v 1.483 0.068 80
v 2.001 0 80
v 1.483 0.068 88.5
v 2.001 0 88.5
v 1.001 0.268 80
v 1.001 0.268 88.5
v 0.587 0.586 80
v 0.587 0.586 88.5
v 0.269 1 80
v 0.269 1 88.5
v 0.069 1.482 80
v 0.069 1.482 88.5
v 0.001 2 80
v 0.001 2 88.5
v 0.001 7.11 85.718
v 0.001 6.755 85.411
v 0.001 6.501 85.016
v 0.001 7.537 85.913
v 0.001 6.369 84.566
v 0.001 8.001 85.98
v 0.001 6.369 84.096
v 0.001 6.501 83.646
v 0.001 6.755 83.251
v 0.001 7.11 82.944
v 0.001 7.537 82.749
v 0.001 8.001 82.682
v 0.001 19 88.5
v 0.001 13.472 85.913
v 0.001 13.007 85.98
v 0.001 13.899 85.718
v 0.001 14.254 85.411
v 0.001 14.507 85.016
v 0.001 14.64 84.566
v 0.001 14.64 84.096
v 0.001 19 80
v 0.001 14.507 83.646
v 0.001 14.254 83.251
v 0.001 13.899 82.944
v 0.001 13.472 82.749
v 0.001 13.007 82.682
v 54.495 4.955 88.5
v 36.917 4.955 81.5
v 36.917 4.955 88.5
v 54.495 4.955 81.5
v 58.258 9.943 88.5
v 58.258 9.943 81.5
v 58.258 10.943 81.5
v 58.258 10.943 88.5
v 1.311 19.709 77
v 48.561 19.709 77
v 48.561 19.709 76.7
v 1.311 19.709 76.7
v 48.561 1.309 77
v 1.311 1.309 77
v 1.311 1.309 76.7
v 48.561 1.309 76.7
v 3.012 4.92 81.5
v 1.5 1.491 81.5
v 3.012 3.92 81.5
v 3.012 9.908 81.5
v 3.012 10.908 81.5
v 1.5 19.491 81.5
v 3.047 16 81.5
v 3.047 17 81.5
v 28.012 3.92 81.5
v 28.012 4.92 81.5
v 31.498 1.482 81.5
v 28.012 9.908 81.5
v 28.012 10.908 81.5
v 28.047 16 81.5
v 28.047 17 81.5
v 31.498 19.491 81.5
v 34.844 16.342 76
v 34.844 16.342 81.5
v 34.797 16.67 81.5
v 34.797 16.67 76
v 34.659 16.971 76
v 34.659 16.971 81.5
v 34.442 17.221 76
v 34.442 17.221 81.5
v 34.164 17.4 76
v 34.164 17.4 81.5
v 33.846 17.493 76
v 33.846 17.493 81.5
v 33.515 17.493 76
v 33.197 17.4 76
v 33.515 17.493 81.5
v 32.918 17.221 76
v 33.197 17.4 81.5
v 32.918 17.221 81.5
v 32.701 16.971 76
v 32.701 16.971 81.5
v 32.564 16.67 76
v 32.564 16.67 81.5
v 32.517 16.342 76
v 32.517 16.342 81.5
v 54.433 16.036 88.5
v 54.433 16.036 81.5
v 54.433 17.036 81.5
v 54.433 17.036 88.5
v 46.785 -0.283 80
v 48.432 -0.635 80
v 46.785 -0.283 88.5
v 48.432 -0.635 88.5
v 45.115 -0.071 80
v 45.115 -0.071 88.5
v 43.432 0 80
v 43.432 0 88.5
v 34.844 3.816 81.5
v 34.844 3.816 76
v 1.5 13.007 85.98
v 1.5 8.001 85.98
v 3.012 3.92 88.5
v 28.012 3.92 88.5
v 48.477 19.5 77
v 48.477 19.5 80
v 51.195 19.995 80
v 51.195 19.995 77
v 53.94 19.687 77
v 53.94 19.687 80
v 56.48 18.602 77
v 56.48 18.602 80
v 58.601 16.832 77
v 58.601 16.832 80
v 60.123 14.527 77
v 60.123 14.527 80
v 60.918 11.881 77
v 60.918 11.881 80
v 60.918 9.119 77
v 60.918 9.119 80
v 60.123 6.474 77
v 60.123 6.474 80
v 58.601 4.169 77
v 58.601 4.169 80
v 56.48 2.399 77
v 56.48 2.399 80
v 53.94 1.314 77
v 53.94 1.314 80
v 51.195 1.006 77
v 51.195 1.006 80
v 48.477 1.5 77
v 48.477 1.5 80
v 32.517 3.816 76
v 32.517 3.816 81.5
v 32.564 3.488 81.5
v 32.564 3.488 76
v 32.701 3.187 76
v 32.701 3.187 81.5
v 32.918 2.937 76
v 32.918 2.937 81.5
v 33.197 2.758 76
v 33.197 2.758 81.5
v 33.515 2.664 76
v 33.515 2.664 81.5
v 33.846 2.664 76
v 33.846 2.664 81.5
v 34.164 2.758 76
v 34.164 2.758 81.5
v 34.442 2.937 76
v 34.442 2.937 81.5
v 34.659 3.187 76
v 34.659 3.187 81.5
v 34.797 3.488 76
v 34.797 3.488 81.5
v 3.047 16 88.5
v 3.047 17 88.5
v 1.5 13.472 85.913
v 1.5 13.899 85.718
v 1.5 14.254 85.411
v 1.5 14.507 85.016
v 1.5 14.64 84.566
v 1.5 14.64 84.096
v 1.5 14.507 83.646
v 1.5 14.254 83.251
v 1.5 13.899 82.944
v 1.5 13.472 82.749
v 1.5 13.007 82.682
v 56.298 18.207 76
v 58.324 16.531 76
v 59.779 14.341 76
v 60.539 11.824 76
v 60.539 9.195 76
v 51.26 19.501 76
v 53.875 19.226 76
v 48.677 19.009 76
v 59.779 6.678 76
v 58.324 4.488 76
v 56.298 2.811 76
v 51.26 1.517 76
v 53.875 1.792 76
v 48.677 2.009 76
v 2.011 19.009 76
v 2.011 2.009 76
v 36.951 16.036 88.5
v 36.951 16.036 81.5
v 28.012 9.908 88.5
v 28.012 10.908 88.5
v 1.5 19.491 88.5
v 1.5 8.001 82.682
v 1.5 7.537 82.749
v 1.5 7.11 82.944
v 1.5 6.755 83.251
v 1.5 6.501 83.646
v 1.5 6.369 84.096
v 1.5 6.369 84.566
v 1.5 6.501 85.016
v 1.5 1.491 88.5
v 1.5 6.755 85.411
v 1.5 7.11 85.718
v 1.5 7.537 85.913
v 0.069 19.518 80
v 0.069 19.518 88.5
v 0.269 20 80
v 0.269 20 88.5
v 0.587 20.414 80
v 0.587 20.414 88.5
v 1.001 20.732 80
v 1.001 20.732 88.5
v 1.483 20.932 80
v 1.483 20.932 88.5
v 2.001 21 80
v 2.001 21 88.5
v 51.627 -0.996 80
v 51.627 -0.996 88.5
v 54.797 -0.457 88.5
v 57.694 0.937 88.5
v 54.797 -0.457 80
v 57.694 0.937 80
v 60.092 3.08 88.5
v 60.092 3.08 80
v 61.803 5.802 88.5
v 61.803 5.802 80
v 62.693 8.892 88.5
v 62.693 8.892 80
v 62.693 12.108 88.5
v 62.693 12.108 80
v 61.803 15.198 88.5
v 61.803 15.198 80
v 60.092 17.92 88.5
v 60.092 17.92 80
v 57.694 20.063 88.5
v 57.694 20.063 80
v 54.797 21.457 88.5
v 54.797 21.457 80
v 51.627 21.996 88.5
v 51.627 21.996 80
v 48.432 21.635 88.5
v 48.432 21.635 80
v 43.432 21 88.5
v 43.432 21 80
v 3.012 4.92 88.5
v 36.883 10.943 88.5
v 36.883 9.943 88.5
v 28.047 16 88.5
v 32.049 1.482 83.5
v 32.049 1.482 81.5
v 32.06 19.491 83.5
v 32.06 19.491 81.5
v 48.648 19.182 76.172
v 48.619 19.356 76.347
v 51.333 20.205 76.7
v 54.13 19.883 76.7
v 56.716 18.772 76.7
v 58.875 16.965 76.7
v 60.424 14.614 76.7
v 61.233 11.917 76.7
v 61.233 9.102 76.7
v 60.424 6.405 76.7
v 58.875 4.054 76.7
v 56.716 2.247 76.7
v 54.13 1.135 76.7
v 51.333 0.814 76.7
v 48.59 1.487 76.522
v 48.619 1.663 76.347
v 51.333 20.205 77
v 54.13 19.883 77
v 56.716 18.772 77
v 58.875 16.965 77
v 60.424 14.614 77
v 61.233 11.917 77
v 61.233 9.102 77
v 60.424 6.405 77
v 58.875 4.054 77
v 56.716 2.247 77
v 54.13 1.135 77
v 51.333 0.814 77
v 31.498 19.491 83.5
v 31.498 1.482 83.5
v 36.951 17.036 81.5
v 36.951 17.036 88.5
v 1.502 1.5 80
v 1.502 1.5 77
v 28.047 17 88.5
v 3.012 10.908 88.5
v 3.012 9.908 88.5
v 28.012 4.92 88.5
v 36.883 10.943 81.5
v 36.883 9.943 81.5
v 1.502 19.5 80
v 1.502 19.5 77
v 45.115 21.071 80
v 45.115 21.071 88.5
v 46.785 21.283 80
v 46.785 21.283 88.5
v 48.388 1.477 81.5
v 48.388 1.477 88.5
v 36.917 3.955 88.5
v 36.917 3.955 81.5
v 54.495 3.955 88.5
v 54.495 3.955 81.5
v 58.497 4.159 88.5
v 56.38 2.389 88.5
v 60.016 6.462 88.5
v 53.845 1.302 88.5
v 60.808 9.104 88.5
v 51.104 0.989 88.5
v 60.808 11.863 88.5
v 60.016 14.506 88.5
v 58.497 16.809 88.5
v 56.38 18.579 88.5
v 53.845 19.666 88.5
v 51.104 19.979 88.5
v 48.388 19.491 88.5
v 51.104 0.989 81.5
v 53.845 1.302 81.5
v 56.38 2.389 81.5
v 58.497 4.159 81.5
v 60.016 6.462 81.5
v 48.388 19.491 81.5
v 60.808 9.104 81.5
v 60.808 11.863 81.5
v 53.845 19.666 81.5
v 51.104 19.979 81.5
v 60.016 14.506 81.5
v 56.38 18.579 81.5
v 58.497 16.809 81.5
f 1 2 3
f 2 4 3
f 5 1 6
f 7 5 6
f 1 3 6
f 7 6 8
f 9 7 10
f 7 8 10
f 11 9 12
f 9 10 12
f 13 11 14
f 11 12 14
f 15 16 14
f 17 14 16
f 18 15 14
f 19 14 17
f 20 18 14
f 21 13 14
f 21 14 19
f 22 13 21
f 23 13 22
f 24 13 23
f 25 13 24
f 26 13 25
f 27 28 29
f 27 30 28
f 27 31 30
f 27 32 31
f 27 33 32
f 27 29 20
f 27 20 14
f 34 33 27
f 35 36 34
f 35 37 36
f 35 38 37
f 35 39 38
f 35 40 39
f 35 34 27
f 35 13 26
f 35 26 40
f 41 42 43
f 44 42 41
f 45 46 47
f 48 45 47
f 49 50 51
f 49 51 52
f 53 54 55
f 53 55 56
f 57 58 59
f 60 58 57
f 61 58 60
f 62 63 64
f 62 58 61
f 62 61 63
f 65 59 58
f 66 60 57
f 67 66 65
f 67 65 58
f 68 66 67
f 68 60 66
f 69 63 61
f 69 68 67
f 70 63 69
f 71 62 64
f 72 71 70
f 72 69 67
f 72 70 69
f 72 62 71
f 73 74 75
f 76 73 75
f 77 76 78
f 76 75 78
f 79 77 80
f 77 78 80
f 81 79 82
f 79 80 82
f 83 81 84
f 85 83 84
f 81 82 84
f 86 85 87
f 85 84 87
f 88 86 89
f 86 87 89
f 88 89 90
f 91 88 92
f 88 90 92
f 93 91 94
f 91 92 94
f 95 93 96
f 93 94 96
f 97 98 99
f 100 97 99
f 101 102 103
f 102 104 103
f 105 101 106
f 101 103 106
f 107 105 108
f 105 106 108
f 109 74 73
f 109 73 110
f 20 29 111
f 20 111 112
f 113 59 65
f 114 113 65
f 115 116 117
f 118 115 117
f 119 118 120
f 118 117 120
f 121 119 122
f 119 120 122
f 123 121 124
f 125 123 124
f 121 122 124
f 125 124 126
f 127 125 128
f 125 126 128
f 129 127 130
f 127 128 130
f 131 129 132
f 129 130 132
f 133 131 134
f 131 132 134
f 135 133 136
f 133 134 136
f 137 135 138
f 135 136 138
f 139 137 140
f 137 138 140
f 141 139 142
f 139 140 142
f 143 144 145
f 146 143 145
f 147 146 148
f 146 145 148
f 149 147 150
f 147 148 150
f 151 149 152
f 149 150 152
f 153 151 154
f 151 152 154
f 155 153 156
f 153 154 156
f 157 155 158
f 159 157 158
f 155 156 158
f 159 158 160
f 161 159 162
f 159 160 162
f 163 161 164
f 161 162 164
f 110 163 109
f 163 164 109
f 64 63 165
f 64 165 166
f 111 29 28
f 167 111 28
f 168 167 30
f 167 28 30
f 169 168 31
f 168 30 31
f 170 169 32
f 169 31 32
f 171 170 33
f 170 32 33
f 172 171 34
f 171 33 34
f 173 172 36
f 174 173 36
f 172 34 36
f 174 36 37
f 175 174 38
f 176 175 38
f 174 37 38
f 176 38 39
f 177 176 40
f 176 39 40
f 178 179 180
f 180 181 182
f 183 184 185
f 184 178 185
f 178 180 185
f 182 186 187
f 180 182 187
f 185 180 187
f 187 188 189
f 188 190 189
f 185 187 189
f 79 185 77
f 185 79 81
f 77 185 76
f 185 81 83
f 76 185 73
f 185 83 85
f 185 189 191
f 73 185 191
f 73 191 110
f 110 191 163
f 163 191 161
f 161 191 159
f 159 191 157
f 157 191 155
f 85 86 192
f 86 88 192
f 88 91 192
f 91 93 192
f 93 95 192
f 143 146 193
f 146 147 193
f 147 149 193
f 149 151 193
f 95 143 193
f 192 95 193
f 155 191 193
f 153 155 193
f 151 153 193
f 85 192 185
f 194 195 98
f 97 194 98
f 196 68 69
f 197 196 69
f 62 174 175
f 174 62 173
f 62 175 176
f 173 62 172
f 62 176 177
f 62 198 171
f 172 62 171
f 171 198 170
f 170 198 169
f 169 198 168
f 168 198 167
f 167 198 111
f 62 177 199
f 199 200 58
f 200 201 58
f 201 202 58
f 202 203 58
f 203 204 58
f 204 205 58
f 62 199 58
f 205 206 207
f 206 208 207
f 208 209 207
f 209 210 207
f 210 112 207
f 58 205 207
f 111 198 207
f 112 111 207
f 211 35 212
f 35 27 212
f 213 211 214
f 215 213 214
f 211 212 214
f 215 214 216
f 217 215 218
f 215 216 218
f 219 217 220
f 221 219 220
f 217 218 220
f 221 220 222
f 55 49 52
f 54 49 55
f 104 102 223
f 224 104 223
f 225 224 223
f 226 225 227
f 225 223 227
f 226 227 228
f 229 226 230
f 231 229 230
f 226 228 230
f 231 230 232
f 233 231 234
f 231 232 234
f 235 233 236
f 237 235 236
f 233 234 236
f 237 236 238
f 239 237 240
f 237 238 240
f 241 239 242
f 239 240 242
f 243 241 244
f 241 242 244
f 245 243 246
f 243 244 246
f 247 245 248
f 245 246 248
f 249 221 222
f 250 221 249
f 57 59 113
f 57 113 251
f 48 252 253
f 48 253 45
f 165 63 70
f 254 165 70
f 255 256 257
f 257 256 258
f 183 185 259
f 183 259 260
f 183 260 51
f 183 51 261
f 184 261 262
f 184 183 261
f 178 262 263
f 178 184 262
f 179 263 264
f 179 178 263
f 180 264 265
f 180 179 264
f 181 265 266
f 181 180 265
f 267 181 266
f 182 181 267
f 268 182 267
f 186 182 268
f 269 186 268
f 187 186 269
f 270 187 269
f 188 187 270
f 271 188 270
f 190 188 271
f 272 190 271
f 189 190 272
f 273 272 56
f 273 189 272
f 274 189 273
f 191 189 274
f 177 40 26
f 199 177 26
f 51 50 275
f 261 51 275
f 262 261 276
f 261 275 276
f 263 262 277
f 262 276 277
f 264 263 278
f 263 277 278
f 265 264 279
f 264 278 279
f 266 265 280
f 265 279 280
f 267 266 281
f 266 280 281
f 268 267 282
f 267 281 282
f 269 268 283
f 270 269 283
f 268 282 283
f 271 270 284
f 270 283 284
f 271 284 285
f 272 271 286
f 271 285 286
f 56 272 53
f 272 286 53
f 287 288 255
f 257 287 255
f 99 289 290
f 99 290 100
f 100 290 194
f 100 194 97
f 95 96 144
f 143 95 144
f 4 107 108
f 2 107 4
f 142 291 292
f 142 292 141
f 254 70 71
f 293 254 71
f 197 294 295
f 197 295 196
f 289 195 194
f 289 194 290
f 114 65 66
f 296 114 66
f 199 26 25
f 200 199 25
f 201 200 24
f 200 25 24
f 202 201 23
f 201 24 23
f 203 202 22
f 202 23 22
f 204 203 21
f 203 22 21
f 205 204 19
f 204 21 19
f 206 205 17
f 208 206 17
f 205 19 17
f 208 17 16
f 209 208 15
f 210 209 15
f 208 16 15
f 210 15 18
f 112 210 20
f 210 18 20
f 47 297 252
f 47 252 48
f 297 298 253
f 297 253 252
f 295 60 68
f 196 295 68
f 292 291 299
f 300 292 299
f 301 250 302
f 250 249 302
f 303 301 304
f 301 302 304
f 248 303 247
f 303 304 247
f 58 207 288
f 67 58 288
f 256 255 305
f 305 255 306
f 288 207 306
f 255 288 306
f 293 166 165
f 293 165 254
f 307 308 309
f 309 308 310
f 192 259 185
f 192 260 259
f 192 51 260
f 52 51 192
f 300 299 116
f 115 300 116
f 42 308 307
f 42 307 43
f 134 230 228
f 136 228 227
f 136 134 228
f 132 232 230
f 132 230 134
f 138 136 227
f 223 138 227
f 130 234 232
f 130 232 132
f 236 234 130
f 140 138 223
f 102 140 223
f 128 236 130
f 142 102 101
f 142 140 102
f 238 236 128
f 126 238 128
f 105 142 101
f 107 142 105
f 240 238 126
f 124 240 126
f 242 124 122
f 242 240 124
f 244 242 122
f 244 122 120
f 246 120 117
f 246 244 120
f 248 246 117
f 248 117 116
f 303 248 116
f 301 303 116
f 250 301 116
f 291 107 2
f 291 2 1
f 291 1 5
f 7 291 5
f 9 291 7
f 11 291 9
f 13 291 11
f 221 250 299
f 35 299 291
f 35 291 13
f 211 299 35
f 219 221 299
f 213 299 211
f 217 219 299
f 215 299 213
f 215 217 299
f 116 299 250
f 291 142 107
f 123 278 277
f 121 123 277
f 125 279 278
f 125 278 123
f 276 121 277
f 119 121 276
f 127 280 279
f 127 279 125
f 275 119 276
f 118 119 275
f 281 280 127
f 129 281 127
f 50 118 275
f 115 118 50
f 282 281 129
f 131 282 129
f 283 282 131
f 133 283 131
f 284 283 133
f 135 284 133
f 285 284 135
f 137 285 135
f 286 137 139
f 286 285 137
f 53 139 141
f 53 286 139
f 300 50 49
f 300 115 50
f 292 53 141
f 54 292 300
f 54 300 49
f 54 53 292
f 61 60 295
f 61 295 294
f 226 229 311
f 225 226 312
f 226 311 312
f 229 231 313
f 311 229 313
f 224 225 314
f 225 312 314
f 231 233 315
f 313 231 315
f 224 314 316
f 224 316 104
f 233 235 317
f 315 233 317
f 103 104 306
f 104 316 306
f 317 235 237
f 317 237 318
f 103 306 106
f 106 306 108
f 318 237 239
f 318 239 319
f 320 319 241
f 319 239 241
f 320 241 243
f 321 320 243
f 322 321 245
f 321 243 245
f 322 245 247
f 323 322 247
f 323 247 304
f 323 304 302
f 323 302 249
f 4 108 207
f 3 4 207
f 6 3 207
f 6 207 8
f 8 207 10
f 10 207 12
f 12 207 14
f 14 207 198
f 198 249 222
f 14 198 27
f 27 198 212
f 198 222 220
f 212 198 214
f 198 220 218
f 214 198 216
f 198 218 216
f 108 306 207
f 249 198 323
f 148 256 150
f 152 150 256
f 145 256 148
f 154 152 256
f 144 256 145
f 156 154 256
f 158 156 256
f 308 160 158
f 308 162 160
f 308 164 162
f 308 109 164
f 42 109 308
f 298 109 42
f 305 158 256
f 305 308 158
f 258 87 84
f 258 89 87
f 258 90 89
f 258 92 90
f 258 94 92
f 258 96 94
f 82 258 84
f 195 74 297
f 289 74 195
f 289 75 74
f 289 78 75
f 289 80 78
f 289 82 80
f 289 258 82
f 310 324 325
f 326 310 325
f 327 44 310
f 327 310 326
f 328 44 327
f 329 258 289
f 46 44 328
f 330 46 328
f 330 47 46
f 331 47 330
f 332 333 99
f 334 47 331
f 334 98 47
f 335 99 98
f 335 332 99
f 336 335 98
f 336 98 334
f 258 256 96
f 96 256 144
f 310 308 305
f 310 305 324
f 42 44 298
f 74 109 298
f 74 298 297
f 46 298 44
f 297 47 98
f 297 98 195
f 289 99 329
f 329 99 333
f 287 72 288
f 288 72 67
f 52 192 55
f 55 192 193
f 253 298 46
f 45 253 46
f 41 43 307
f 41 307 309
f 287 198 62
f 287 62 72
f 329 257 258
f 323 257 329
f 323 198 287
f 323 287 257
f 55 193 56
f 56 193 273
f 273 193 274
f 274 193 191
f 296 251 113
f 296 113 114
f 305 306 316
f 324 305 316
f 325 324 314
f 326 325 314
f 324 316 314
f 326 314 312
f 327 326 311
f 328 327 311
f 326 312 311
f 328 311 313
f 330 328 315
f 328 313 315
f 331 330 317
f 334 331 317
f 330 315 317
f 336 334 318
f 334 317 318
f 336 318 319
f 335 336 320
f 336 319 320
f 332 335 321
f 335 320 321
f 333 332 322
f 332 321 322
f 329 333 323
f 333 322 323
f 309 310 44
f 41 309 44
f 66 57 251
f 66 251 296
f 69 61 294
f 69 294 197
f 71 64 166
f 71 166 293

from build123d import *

# Parameters (mm, degrees)
PAD001_DEPTH    = 8.5
PAD002_DEPTH    = 3
FILLET008_R     = 20
FILLET009_R     = 20
FILLET010_R     = 2
FILLET011_R     = 2
POCKET002_DEPTH = 7
POCKET003_DEPTH = 5
PAD006_DEPTH    = 2
POCKET004_DEPTH = 5
PAD007_DEPTH    = 1
CHAMFER_SIZE    = 0.7
POCKET009_DEPTH = 5
SKETCH017_W     = 25
SKETCH017_H     = 1
SKETCH017_W_2   = 17.481396
SKETCH017_W_3   = 21.375297
SKETCH017_W_4   = 17.578514
PAD008_DEPTH    = 7


with BuildPart() as part:
    # Sketch004 → Pad001 (new body)
    with BuildSketch(Plane.XY.offset(80)):
        with BuildLine():
            Line((0.000991, 21), (46.615791, 21))
            ThreePointArc((46.615791, 0), (62.806207, 10.5), (46.615791, 21))
            Line((46.615791, 0), (0.000991, 0))
            Line((0.000991, 0), (0.000991, 21))
        make_face()
    extrude(amount=PAD001_DEPTH)

    # Sketch005 → Pad002 (new body)
    with BuildSketch(Plane(origin=(0, 0, 80), x_dir=(1, 0, 0), z_dir=(0, 0, -1))):
        with BuildLine():
            Line((1.502067, -19.500282), (48.477067, -19.500282))
            ThreePointArc((48.477067, -19.500282), (61.018448, -10.500282), (48.477067, -1.500282))
            Line((1.502067, -1.500282), (48.477067, -1.500282))
            Line((1.502067, -1.500282), (1.502067, -19.500282))
        make_face()
    extrude(amount=PAD002_DEPTH)

    # Fillet008
    fillet008_edges = [part.edges().sort_by_distance(p)[0] for p in [
        (46.615791, 21, 84.25),
    ]]
    fillet(fillet008_edges, radius=FILLET008_R)

    # Fillet009
    fillet009_edges = [part.edges().sort_by_distance(p)[0] for p in [
        (46.615791, 0, 84.25),
    ]]
    fillet(fillet009_edges, radius=FILLET009_R)

    # Fillet010
    fillet010_edges = [part.edges().sort_by_distance(p)[0] for p in [
        (0.000991, 0, 84.25),
    ]]
    fillet(fillet010_edges, radius=FILLET010_R)

    # Fillet011
    fillet011_edges = [part.edges().sort_by_distance(p)[0] for p in [
        (0.000991, 21, 84.25),
    ]]
    fillet(fillet011_edges, radius=FILLET011_R)

    # Sketch006 → Pocket002 (cut)
    with BuildSketch(Plane.XY.offset(88.5)):
        with BuildLine():
            Line((1.500423, 1.490874), (48.388216, 1.476974))
            ThreePointArc((48.388216, 1.476974), (60.908955, 10.483923), (48.388218, 19.490874))
            Line((1.500423, 19.490874), (48.388218, 19.490874))
            Line((1.500423, 19.490874), (1.500423, 1.490874))
        make_face()
    extrude(amount=-POCKET002_DEPTH, mode=Mode.SUBTRACT)

    # Sketch007 → Pocket003 (cut)
    with BuildSketch(Plane(origin=(0.000991, 0, 80), x_dir=(0, -1, 0), z_dir=(-1, 0, 0))):
        with BuildLine():
            ThreePointArc((-13.007468, 5.979853), (-14.65632, 4.331001), (-13.007468, 2.682149))
            Line((-13.007468, 2.682149), (-8.001338, 2.682149))
            ThreePointArc((-8.001338, 2.682149), (-6.352486, 4.331001), (-8.001338, 5.979853))
            Line((-13.007468, 5.979853), (-8.001338, 5.979853))
        make_face()
    extrude(amount=-POCKET003_DEPTH, mode=Mode.SUBTRACT)

    # Sketch012 → Pad006 (new body)
    with BuildSketch(Plane.XY.offset(81.5)):
        Polygon((31.498466, 19.496653), (31.498466, 1.452961), (32.048512, 1.452961), (32.059631, 19.496653), align=None)
    extrude(amount=PAD006_DEPTH)

    # Sketch013 → Pocket004 (cut)
    with BuildSketch(Plane.XY.offset(81.5)):
        with BuildLine():
            ThreePointArc((34.843688, 16.341736), (33.680227, 17.505197), (32.516766, 16.341736))
            Line((32.516766, 16.341736), (32.516766, 3.815891))
            ThreePointArc((32.516766, 3.815891), (33.680227, 2.65243), (34.843688, 3.815891))
            Line((34.843688, 16.341736), (34.843688, 3.815891))
        make_face()
    extrude(amount=-POCKET004_DEPTH, mode=Mode.SUBTRACT)

    # Sketch015 → Pad007 (new body)
    with BuildSketch(Plane(origin=(0, 0, 77), x_dir=(1, 0, 0), z_dir=(0, 0, -1))):
        with BuildLine():
            Line((1.311159, -1.309228), (48.561159, -1.309228))
            ThreePointArc((48.561159, -19.709228), (61.335244, -10.509228), (48.561159, -1.309228))
            Line((48.561159, -19.709228), (1.311159, -19.709228))
            Line((1.311159, -19.709228), (1.311159, -1.309228))
        make_face()
    extrude(amount=PAD007_DEPTH)

    # Chamfer
    chamfer_edges = [part.edges().sort_by_distance(p)[0] for p in [
        (1.311159, 10.509228, 76),
        (24.936159, 1.309228, 76),
        (24.936159, 19.709228, 76),
        (61.335244, 10.509228, 76),
    ]]
    chamfer(chamfer_edges, length=CHAMFER_SIZE)

    # Sketch016 → Pocket009 (cut)
    with BuildSketch(Plane.XY.offset(77)):
        with BuildLine():
            ThreePointArc((34.843688, 16.341736), (33.680227, 17.505197), (32.516766, 16.341736))
            Line((32.516766, 16.341736), (32.516766, 3.815891))
            ThreePointArc((32.516766, 3.815891), (33.680227, 2.65243), (34.843688, 3.815891))
            Line((34.843688, 16.341736), (34.843688, 3.815891))
        make_face()
    extrude(amount=-POCKET009_DEPTH, mode=Mode.SUBTRACT)

    # Sketch017 → Pad008 (new body)
    with BuildSketch(Plane.XY.offset(81.5)):
        with Locations((15.546838, 16.499521)):
            Rectangle(SKETCH017_W, SKETCH017_H)
        with Locations((15.512423, 10.408272)):
            Rectangle(SKETCH017_W, SKETCH017_H)
        with Locations((15.512423, 4.420265)):
            Rectangle(SKETCH017_W, SKETCH017_H)
        with Locations((45.692045, 16.535934)):
            Rectangle(SKETCH017_W_2, SKETCH017_H)
        with Locations((47.570167, 10.442687)):
            Rectangle(SKETCH017_W_3, SKETCH017_H)
        with Locations((45.706188, 4.454679)):
            Rectangle(SKETCH017_W_4, SKETCH017_H)
    extrude(amount=PAD008_DEPTH)


solid = part.part
